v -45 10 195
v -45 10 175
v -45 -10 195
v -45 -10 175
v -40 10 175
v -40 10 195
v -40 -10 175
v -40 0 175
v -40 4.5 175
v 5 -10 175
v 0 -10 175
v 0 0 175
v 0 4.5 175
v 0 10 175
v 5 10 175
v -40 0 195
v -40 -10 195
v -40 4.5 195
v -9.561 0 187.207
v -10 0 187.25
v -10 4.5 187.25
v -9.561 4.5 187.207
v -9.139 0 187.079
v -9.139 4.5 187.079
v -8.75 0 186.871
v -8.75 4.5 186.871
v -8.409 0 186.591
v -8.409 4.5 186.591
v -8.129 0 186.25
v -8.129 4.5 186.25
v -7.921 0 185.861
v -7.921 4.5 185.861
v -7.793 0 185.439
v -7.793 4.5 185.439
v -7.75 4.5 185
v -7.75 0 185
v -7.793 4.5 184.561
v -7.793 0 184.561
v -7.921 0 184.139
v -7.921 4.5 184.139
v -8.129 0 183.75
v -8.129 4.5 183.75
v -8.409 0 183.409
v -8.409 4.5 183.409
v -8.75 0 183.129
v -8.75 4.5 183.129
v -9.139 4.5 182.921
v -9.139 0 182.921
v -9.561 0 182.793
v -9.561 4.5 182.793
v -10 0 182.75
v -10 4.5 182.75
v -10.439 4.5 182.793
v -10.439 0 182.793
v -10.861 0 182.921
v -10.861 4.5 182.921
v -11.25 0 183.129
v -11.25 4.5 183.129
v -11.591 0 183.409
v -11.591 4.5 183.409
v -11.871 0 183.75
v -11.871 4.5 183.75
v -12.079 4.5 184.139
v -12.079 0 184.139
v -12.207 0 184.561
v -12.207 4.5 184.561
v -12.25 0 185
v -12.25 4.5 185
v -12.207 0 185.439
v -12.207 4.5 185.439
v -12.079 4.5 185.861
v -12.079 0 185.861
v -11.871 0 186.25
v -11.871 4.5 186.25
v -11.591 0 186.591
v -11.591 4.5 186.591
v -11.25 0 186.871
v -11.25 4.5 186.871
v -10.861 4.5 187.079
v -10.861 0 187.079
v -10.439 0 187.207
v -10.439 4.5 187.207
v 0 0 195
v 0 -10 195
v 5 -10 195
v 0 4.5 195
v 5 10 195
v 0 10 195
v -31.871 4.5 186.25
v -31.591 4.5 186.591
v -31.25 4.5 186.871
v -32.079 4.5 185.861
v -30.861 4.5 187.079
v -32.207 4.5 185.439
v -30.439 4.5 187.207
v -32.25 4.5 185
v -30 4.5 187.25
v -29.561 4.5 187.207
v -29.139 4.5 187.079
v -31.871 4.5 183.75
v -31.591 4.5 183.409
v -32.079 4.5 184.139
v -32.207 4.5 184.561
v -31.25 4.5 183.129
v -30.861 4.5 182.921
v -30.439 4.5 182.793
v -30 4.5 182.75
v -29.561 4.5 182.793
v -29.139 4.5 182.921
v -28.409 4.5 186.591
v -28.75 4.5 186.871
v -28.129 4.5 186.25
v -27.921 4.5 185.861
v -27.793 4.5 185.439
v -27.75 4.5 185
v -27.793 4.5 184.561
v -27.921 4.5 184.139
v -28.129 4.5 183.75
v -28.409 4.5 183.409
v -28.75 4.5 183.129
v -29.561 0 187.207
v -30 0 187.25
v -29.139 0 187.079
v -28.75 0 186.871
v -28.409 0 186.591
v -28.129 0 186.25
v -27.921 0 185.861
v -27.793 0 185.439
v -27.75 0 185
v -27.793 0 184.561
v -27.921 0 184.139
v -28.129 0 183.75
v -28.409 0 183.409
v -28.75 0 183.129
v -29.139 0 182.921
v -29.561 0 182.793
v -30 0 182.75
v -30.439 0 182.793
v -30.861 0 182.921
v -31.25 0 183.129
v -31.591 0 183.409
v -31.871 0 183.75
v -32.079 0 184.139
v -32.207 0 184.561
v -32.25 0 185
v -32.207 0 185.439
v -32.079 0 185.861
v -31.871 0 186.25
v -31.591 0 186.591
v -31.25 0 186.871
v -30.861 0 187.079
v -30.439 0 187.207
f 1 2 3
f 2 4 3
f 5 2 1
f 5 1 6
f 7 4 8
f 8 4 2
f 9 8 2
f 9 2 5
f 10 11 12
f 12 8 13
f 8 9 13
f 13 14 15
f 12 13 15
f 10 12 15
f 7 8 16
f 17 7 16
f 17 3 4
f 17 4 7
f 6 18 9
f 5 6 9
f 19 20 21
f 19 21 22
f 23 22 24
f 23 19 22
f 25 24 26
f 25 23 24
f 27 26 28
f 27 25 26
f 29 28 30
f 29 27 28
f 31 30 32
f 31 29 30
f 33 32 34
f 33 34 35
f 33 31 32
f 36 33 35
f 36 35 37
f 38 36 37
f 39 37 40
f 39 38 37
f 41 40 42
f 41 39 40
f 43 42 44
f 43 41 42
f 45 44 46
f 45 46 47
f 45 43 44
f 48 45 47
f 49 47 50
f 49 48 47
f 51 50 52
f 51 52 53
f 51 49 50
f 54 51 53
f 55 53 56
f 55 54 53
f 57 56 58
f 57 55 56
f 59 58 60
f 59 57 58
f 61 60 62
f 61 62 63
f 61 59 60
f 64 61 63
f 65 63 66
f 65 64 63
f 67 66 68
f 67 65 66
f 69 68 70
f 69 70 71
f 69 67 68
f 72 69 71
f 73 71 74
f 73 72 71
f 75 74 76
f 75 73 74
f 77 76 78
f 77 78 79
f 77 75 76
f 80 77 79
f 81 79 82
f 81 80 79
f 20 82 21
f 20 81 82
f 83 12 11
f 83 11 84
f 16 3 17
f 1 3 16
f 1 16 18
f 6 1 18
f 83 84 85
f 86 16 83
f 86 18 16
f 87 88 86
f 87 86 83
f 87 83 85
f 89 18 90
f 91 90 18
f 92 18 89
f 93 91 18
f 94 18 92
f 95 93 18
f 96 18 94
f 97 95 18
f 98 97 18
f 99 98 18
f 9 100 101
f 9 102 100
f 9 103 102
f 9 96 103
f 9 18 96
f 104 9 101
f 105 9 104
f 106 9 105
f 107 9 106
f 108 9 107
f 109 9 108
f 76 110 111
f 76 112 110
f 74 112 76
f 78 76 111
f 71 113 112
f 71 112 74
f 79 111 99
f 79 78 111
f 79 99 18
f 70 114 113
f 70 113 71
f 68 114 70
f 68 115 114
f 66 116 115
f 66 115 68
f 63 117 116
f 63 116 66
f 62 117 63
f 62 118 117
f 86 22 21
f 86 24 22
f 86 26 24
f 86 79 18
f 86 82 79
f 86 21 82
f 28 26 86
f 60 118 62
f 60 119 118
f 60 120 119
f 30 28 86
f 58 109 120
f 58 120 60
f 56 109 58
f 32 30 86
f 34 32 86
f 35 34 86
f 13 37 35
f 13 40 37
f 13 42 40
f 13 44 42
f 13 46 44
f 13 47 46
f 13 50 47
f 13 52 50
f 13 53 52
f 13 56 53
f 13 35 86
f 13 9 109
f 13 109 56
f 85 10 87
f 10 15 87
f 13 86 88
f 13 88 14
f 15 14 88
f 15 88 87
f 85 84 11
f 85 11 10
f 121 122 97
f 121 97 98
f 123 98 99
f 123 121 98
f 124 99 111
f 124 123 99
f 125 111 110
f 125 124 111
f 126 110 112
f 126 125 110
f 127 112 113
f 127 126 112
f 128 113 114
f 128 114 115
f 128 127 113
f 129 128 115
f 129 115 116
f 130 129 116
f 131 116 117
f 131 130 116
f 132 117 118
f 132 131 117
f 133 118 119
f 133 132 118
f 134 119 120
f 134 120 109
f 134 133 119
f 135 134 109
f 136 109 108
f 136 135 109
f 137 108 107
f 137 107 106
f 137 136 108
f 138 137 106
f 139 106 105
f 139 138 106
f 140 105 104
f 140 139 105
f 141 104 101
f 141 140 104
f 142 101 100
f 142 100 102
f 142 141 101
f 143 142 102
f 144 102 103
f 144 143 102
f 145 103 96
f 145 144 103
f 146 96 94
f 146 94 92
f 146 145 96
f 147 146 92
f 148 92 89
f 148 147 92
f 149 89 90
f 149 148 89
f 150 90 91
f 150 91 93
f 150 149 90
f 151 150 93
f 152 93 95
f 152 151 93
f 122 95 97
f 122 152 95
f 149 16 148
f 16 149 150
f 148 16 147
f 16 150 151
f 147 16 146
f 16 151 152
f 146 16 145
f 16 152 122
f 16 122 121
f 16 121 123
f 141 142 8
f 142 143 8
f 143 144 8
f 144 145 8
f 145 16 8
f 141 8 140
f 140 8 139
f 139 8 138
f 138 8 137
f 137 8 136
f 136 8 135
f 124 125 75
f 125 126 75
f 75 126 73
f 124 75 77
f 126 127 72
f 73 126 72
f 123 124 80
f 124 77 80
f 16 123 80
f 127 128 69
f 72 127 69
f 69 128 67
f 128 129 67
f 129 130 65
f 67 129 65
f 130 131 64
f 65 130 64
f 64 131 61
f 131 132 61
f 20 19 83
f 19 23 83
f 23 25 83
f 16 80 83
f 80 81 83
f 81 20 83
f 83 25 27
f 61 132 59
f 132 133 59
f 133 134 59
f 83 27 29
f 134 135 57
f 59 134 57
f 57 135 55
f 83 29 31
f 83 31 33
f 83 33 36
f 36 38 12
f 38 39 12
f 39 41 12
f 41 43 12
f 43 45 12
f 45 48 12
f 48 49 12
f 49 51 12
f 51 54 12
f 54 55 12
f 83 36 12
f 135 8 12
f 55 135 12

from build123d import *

# Parameters (mm, degrees)
CROQUIS1_R              = 2.25
SALIENTE_EXTRUIR1_DEPTH = 4.5
CROQUIS3_W              = 5
CROQUIS3_H              = 20
SALIENTE_EXTRUIR3_DEPTH = 5.5
CROQUIS4_W              = 5
CROQUIS4_H              = 20
SALIENTE_EXTRUIR4_DEPTH = 10


with BuildPart() as part:
    # Croquis1 → Saliente-Extruir1 (new body)
    with BuildSketch(Plane(origin=(0, 0, 0), x_dir=(1, 0, 0), z_dir=(0, 1, 0))):
        Polygon((-35, -175), (-45, -175), (-45, -195), (-35, -195), (-5, -195), (5, -195), (5, -175), (-5, -175), align=None)
        with Locations(Location((-30, -185, 0), (0, 0, 270))):
            Circle(CROQUIS1_R, mode=Mode.SUBTRACT)
        with Locations(Location((-10, -185, 0), (0, 0, 270))):
            Circle(CROQUIS1_R, mode=Mode.SUBTRACT)
    extrude(amount=SALIENTE_EXTRUIR1_DEPTH)

    # Croquis3 → Saliente-Extruir3 (add)
    with BuildSketch(Plane(origin=(0, 4.5, 0), x_dir=(1, 0, 0), z_dir=(0, 1, 0))):
        with Locations((2.5, -185)):
            Rectangle(CROQUIS3_W, CROQUIS3_H)
        with Locations((-42.5, -185)):
            Rectangle(CROQUIS3_W, CROQUIS3_H)
    extrude(amount=SALIENTE_EXTRUIR3_DEPTH)

    # Croquis4 → Saliente-Extruir4 (add)
    with BuildSketch(Plane.XZ):
        with Locations((2.5, 185)):
            Rectangle(CROQUIS4_W, CROQUIS4_H)
        Polygon((-40, 175), (-40, 195), (-45, 195), (-45, 175), (-40.824678474, 175), align=None)
    extrude(amount=SALIENTE_EXTRUIR4_DEPTH)


solid = part.part
